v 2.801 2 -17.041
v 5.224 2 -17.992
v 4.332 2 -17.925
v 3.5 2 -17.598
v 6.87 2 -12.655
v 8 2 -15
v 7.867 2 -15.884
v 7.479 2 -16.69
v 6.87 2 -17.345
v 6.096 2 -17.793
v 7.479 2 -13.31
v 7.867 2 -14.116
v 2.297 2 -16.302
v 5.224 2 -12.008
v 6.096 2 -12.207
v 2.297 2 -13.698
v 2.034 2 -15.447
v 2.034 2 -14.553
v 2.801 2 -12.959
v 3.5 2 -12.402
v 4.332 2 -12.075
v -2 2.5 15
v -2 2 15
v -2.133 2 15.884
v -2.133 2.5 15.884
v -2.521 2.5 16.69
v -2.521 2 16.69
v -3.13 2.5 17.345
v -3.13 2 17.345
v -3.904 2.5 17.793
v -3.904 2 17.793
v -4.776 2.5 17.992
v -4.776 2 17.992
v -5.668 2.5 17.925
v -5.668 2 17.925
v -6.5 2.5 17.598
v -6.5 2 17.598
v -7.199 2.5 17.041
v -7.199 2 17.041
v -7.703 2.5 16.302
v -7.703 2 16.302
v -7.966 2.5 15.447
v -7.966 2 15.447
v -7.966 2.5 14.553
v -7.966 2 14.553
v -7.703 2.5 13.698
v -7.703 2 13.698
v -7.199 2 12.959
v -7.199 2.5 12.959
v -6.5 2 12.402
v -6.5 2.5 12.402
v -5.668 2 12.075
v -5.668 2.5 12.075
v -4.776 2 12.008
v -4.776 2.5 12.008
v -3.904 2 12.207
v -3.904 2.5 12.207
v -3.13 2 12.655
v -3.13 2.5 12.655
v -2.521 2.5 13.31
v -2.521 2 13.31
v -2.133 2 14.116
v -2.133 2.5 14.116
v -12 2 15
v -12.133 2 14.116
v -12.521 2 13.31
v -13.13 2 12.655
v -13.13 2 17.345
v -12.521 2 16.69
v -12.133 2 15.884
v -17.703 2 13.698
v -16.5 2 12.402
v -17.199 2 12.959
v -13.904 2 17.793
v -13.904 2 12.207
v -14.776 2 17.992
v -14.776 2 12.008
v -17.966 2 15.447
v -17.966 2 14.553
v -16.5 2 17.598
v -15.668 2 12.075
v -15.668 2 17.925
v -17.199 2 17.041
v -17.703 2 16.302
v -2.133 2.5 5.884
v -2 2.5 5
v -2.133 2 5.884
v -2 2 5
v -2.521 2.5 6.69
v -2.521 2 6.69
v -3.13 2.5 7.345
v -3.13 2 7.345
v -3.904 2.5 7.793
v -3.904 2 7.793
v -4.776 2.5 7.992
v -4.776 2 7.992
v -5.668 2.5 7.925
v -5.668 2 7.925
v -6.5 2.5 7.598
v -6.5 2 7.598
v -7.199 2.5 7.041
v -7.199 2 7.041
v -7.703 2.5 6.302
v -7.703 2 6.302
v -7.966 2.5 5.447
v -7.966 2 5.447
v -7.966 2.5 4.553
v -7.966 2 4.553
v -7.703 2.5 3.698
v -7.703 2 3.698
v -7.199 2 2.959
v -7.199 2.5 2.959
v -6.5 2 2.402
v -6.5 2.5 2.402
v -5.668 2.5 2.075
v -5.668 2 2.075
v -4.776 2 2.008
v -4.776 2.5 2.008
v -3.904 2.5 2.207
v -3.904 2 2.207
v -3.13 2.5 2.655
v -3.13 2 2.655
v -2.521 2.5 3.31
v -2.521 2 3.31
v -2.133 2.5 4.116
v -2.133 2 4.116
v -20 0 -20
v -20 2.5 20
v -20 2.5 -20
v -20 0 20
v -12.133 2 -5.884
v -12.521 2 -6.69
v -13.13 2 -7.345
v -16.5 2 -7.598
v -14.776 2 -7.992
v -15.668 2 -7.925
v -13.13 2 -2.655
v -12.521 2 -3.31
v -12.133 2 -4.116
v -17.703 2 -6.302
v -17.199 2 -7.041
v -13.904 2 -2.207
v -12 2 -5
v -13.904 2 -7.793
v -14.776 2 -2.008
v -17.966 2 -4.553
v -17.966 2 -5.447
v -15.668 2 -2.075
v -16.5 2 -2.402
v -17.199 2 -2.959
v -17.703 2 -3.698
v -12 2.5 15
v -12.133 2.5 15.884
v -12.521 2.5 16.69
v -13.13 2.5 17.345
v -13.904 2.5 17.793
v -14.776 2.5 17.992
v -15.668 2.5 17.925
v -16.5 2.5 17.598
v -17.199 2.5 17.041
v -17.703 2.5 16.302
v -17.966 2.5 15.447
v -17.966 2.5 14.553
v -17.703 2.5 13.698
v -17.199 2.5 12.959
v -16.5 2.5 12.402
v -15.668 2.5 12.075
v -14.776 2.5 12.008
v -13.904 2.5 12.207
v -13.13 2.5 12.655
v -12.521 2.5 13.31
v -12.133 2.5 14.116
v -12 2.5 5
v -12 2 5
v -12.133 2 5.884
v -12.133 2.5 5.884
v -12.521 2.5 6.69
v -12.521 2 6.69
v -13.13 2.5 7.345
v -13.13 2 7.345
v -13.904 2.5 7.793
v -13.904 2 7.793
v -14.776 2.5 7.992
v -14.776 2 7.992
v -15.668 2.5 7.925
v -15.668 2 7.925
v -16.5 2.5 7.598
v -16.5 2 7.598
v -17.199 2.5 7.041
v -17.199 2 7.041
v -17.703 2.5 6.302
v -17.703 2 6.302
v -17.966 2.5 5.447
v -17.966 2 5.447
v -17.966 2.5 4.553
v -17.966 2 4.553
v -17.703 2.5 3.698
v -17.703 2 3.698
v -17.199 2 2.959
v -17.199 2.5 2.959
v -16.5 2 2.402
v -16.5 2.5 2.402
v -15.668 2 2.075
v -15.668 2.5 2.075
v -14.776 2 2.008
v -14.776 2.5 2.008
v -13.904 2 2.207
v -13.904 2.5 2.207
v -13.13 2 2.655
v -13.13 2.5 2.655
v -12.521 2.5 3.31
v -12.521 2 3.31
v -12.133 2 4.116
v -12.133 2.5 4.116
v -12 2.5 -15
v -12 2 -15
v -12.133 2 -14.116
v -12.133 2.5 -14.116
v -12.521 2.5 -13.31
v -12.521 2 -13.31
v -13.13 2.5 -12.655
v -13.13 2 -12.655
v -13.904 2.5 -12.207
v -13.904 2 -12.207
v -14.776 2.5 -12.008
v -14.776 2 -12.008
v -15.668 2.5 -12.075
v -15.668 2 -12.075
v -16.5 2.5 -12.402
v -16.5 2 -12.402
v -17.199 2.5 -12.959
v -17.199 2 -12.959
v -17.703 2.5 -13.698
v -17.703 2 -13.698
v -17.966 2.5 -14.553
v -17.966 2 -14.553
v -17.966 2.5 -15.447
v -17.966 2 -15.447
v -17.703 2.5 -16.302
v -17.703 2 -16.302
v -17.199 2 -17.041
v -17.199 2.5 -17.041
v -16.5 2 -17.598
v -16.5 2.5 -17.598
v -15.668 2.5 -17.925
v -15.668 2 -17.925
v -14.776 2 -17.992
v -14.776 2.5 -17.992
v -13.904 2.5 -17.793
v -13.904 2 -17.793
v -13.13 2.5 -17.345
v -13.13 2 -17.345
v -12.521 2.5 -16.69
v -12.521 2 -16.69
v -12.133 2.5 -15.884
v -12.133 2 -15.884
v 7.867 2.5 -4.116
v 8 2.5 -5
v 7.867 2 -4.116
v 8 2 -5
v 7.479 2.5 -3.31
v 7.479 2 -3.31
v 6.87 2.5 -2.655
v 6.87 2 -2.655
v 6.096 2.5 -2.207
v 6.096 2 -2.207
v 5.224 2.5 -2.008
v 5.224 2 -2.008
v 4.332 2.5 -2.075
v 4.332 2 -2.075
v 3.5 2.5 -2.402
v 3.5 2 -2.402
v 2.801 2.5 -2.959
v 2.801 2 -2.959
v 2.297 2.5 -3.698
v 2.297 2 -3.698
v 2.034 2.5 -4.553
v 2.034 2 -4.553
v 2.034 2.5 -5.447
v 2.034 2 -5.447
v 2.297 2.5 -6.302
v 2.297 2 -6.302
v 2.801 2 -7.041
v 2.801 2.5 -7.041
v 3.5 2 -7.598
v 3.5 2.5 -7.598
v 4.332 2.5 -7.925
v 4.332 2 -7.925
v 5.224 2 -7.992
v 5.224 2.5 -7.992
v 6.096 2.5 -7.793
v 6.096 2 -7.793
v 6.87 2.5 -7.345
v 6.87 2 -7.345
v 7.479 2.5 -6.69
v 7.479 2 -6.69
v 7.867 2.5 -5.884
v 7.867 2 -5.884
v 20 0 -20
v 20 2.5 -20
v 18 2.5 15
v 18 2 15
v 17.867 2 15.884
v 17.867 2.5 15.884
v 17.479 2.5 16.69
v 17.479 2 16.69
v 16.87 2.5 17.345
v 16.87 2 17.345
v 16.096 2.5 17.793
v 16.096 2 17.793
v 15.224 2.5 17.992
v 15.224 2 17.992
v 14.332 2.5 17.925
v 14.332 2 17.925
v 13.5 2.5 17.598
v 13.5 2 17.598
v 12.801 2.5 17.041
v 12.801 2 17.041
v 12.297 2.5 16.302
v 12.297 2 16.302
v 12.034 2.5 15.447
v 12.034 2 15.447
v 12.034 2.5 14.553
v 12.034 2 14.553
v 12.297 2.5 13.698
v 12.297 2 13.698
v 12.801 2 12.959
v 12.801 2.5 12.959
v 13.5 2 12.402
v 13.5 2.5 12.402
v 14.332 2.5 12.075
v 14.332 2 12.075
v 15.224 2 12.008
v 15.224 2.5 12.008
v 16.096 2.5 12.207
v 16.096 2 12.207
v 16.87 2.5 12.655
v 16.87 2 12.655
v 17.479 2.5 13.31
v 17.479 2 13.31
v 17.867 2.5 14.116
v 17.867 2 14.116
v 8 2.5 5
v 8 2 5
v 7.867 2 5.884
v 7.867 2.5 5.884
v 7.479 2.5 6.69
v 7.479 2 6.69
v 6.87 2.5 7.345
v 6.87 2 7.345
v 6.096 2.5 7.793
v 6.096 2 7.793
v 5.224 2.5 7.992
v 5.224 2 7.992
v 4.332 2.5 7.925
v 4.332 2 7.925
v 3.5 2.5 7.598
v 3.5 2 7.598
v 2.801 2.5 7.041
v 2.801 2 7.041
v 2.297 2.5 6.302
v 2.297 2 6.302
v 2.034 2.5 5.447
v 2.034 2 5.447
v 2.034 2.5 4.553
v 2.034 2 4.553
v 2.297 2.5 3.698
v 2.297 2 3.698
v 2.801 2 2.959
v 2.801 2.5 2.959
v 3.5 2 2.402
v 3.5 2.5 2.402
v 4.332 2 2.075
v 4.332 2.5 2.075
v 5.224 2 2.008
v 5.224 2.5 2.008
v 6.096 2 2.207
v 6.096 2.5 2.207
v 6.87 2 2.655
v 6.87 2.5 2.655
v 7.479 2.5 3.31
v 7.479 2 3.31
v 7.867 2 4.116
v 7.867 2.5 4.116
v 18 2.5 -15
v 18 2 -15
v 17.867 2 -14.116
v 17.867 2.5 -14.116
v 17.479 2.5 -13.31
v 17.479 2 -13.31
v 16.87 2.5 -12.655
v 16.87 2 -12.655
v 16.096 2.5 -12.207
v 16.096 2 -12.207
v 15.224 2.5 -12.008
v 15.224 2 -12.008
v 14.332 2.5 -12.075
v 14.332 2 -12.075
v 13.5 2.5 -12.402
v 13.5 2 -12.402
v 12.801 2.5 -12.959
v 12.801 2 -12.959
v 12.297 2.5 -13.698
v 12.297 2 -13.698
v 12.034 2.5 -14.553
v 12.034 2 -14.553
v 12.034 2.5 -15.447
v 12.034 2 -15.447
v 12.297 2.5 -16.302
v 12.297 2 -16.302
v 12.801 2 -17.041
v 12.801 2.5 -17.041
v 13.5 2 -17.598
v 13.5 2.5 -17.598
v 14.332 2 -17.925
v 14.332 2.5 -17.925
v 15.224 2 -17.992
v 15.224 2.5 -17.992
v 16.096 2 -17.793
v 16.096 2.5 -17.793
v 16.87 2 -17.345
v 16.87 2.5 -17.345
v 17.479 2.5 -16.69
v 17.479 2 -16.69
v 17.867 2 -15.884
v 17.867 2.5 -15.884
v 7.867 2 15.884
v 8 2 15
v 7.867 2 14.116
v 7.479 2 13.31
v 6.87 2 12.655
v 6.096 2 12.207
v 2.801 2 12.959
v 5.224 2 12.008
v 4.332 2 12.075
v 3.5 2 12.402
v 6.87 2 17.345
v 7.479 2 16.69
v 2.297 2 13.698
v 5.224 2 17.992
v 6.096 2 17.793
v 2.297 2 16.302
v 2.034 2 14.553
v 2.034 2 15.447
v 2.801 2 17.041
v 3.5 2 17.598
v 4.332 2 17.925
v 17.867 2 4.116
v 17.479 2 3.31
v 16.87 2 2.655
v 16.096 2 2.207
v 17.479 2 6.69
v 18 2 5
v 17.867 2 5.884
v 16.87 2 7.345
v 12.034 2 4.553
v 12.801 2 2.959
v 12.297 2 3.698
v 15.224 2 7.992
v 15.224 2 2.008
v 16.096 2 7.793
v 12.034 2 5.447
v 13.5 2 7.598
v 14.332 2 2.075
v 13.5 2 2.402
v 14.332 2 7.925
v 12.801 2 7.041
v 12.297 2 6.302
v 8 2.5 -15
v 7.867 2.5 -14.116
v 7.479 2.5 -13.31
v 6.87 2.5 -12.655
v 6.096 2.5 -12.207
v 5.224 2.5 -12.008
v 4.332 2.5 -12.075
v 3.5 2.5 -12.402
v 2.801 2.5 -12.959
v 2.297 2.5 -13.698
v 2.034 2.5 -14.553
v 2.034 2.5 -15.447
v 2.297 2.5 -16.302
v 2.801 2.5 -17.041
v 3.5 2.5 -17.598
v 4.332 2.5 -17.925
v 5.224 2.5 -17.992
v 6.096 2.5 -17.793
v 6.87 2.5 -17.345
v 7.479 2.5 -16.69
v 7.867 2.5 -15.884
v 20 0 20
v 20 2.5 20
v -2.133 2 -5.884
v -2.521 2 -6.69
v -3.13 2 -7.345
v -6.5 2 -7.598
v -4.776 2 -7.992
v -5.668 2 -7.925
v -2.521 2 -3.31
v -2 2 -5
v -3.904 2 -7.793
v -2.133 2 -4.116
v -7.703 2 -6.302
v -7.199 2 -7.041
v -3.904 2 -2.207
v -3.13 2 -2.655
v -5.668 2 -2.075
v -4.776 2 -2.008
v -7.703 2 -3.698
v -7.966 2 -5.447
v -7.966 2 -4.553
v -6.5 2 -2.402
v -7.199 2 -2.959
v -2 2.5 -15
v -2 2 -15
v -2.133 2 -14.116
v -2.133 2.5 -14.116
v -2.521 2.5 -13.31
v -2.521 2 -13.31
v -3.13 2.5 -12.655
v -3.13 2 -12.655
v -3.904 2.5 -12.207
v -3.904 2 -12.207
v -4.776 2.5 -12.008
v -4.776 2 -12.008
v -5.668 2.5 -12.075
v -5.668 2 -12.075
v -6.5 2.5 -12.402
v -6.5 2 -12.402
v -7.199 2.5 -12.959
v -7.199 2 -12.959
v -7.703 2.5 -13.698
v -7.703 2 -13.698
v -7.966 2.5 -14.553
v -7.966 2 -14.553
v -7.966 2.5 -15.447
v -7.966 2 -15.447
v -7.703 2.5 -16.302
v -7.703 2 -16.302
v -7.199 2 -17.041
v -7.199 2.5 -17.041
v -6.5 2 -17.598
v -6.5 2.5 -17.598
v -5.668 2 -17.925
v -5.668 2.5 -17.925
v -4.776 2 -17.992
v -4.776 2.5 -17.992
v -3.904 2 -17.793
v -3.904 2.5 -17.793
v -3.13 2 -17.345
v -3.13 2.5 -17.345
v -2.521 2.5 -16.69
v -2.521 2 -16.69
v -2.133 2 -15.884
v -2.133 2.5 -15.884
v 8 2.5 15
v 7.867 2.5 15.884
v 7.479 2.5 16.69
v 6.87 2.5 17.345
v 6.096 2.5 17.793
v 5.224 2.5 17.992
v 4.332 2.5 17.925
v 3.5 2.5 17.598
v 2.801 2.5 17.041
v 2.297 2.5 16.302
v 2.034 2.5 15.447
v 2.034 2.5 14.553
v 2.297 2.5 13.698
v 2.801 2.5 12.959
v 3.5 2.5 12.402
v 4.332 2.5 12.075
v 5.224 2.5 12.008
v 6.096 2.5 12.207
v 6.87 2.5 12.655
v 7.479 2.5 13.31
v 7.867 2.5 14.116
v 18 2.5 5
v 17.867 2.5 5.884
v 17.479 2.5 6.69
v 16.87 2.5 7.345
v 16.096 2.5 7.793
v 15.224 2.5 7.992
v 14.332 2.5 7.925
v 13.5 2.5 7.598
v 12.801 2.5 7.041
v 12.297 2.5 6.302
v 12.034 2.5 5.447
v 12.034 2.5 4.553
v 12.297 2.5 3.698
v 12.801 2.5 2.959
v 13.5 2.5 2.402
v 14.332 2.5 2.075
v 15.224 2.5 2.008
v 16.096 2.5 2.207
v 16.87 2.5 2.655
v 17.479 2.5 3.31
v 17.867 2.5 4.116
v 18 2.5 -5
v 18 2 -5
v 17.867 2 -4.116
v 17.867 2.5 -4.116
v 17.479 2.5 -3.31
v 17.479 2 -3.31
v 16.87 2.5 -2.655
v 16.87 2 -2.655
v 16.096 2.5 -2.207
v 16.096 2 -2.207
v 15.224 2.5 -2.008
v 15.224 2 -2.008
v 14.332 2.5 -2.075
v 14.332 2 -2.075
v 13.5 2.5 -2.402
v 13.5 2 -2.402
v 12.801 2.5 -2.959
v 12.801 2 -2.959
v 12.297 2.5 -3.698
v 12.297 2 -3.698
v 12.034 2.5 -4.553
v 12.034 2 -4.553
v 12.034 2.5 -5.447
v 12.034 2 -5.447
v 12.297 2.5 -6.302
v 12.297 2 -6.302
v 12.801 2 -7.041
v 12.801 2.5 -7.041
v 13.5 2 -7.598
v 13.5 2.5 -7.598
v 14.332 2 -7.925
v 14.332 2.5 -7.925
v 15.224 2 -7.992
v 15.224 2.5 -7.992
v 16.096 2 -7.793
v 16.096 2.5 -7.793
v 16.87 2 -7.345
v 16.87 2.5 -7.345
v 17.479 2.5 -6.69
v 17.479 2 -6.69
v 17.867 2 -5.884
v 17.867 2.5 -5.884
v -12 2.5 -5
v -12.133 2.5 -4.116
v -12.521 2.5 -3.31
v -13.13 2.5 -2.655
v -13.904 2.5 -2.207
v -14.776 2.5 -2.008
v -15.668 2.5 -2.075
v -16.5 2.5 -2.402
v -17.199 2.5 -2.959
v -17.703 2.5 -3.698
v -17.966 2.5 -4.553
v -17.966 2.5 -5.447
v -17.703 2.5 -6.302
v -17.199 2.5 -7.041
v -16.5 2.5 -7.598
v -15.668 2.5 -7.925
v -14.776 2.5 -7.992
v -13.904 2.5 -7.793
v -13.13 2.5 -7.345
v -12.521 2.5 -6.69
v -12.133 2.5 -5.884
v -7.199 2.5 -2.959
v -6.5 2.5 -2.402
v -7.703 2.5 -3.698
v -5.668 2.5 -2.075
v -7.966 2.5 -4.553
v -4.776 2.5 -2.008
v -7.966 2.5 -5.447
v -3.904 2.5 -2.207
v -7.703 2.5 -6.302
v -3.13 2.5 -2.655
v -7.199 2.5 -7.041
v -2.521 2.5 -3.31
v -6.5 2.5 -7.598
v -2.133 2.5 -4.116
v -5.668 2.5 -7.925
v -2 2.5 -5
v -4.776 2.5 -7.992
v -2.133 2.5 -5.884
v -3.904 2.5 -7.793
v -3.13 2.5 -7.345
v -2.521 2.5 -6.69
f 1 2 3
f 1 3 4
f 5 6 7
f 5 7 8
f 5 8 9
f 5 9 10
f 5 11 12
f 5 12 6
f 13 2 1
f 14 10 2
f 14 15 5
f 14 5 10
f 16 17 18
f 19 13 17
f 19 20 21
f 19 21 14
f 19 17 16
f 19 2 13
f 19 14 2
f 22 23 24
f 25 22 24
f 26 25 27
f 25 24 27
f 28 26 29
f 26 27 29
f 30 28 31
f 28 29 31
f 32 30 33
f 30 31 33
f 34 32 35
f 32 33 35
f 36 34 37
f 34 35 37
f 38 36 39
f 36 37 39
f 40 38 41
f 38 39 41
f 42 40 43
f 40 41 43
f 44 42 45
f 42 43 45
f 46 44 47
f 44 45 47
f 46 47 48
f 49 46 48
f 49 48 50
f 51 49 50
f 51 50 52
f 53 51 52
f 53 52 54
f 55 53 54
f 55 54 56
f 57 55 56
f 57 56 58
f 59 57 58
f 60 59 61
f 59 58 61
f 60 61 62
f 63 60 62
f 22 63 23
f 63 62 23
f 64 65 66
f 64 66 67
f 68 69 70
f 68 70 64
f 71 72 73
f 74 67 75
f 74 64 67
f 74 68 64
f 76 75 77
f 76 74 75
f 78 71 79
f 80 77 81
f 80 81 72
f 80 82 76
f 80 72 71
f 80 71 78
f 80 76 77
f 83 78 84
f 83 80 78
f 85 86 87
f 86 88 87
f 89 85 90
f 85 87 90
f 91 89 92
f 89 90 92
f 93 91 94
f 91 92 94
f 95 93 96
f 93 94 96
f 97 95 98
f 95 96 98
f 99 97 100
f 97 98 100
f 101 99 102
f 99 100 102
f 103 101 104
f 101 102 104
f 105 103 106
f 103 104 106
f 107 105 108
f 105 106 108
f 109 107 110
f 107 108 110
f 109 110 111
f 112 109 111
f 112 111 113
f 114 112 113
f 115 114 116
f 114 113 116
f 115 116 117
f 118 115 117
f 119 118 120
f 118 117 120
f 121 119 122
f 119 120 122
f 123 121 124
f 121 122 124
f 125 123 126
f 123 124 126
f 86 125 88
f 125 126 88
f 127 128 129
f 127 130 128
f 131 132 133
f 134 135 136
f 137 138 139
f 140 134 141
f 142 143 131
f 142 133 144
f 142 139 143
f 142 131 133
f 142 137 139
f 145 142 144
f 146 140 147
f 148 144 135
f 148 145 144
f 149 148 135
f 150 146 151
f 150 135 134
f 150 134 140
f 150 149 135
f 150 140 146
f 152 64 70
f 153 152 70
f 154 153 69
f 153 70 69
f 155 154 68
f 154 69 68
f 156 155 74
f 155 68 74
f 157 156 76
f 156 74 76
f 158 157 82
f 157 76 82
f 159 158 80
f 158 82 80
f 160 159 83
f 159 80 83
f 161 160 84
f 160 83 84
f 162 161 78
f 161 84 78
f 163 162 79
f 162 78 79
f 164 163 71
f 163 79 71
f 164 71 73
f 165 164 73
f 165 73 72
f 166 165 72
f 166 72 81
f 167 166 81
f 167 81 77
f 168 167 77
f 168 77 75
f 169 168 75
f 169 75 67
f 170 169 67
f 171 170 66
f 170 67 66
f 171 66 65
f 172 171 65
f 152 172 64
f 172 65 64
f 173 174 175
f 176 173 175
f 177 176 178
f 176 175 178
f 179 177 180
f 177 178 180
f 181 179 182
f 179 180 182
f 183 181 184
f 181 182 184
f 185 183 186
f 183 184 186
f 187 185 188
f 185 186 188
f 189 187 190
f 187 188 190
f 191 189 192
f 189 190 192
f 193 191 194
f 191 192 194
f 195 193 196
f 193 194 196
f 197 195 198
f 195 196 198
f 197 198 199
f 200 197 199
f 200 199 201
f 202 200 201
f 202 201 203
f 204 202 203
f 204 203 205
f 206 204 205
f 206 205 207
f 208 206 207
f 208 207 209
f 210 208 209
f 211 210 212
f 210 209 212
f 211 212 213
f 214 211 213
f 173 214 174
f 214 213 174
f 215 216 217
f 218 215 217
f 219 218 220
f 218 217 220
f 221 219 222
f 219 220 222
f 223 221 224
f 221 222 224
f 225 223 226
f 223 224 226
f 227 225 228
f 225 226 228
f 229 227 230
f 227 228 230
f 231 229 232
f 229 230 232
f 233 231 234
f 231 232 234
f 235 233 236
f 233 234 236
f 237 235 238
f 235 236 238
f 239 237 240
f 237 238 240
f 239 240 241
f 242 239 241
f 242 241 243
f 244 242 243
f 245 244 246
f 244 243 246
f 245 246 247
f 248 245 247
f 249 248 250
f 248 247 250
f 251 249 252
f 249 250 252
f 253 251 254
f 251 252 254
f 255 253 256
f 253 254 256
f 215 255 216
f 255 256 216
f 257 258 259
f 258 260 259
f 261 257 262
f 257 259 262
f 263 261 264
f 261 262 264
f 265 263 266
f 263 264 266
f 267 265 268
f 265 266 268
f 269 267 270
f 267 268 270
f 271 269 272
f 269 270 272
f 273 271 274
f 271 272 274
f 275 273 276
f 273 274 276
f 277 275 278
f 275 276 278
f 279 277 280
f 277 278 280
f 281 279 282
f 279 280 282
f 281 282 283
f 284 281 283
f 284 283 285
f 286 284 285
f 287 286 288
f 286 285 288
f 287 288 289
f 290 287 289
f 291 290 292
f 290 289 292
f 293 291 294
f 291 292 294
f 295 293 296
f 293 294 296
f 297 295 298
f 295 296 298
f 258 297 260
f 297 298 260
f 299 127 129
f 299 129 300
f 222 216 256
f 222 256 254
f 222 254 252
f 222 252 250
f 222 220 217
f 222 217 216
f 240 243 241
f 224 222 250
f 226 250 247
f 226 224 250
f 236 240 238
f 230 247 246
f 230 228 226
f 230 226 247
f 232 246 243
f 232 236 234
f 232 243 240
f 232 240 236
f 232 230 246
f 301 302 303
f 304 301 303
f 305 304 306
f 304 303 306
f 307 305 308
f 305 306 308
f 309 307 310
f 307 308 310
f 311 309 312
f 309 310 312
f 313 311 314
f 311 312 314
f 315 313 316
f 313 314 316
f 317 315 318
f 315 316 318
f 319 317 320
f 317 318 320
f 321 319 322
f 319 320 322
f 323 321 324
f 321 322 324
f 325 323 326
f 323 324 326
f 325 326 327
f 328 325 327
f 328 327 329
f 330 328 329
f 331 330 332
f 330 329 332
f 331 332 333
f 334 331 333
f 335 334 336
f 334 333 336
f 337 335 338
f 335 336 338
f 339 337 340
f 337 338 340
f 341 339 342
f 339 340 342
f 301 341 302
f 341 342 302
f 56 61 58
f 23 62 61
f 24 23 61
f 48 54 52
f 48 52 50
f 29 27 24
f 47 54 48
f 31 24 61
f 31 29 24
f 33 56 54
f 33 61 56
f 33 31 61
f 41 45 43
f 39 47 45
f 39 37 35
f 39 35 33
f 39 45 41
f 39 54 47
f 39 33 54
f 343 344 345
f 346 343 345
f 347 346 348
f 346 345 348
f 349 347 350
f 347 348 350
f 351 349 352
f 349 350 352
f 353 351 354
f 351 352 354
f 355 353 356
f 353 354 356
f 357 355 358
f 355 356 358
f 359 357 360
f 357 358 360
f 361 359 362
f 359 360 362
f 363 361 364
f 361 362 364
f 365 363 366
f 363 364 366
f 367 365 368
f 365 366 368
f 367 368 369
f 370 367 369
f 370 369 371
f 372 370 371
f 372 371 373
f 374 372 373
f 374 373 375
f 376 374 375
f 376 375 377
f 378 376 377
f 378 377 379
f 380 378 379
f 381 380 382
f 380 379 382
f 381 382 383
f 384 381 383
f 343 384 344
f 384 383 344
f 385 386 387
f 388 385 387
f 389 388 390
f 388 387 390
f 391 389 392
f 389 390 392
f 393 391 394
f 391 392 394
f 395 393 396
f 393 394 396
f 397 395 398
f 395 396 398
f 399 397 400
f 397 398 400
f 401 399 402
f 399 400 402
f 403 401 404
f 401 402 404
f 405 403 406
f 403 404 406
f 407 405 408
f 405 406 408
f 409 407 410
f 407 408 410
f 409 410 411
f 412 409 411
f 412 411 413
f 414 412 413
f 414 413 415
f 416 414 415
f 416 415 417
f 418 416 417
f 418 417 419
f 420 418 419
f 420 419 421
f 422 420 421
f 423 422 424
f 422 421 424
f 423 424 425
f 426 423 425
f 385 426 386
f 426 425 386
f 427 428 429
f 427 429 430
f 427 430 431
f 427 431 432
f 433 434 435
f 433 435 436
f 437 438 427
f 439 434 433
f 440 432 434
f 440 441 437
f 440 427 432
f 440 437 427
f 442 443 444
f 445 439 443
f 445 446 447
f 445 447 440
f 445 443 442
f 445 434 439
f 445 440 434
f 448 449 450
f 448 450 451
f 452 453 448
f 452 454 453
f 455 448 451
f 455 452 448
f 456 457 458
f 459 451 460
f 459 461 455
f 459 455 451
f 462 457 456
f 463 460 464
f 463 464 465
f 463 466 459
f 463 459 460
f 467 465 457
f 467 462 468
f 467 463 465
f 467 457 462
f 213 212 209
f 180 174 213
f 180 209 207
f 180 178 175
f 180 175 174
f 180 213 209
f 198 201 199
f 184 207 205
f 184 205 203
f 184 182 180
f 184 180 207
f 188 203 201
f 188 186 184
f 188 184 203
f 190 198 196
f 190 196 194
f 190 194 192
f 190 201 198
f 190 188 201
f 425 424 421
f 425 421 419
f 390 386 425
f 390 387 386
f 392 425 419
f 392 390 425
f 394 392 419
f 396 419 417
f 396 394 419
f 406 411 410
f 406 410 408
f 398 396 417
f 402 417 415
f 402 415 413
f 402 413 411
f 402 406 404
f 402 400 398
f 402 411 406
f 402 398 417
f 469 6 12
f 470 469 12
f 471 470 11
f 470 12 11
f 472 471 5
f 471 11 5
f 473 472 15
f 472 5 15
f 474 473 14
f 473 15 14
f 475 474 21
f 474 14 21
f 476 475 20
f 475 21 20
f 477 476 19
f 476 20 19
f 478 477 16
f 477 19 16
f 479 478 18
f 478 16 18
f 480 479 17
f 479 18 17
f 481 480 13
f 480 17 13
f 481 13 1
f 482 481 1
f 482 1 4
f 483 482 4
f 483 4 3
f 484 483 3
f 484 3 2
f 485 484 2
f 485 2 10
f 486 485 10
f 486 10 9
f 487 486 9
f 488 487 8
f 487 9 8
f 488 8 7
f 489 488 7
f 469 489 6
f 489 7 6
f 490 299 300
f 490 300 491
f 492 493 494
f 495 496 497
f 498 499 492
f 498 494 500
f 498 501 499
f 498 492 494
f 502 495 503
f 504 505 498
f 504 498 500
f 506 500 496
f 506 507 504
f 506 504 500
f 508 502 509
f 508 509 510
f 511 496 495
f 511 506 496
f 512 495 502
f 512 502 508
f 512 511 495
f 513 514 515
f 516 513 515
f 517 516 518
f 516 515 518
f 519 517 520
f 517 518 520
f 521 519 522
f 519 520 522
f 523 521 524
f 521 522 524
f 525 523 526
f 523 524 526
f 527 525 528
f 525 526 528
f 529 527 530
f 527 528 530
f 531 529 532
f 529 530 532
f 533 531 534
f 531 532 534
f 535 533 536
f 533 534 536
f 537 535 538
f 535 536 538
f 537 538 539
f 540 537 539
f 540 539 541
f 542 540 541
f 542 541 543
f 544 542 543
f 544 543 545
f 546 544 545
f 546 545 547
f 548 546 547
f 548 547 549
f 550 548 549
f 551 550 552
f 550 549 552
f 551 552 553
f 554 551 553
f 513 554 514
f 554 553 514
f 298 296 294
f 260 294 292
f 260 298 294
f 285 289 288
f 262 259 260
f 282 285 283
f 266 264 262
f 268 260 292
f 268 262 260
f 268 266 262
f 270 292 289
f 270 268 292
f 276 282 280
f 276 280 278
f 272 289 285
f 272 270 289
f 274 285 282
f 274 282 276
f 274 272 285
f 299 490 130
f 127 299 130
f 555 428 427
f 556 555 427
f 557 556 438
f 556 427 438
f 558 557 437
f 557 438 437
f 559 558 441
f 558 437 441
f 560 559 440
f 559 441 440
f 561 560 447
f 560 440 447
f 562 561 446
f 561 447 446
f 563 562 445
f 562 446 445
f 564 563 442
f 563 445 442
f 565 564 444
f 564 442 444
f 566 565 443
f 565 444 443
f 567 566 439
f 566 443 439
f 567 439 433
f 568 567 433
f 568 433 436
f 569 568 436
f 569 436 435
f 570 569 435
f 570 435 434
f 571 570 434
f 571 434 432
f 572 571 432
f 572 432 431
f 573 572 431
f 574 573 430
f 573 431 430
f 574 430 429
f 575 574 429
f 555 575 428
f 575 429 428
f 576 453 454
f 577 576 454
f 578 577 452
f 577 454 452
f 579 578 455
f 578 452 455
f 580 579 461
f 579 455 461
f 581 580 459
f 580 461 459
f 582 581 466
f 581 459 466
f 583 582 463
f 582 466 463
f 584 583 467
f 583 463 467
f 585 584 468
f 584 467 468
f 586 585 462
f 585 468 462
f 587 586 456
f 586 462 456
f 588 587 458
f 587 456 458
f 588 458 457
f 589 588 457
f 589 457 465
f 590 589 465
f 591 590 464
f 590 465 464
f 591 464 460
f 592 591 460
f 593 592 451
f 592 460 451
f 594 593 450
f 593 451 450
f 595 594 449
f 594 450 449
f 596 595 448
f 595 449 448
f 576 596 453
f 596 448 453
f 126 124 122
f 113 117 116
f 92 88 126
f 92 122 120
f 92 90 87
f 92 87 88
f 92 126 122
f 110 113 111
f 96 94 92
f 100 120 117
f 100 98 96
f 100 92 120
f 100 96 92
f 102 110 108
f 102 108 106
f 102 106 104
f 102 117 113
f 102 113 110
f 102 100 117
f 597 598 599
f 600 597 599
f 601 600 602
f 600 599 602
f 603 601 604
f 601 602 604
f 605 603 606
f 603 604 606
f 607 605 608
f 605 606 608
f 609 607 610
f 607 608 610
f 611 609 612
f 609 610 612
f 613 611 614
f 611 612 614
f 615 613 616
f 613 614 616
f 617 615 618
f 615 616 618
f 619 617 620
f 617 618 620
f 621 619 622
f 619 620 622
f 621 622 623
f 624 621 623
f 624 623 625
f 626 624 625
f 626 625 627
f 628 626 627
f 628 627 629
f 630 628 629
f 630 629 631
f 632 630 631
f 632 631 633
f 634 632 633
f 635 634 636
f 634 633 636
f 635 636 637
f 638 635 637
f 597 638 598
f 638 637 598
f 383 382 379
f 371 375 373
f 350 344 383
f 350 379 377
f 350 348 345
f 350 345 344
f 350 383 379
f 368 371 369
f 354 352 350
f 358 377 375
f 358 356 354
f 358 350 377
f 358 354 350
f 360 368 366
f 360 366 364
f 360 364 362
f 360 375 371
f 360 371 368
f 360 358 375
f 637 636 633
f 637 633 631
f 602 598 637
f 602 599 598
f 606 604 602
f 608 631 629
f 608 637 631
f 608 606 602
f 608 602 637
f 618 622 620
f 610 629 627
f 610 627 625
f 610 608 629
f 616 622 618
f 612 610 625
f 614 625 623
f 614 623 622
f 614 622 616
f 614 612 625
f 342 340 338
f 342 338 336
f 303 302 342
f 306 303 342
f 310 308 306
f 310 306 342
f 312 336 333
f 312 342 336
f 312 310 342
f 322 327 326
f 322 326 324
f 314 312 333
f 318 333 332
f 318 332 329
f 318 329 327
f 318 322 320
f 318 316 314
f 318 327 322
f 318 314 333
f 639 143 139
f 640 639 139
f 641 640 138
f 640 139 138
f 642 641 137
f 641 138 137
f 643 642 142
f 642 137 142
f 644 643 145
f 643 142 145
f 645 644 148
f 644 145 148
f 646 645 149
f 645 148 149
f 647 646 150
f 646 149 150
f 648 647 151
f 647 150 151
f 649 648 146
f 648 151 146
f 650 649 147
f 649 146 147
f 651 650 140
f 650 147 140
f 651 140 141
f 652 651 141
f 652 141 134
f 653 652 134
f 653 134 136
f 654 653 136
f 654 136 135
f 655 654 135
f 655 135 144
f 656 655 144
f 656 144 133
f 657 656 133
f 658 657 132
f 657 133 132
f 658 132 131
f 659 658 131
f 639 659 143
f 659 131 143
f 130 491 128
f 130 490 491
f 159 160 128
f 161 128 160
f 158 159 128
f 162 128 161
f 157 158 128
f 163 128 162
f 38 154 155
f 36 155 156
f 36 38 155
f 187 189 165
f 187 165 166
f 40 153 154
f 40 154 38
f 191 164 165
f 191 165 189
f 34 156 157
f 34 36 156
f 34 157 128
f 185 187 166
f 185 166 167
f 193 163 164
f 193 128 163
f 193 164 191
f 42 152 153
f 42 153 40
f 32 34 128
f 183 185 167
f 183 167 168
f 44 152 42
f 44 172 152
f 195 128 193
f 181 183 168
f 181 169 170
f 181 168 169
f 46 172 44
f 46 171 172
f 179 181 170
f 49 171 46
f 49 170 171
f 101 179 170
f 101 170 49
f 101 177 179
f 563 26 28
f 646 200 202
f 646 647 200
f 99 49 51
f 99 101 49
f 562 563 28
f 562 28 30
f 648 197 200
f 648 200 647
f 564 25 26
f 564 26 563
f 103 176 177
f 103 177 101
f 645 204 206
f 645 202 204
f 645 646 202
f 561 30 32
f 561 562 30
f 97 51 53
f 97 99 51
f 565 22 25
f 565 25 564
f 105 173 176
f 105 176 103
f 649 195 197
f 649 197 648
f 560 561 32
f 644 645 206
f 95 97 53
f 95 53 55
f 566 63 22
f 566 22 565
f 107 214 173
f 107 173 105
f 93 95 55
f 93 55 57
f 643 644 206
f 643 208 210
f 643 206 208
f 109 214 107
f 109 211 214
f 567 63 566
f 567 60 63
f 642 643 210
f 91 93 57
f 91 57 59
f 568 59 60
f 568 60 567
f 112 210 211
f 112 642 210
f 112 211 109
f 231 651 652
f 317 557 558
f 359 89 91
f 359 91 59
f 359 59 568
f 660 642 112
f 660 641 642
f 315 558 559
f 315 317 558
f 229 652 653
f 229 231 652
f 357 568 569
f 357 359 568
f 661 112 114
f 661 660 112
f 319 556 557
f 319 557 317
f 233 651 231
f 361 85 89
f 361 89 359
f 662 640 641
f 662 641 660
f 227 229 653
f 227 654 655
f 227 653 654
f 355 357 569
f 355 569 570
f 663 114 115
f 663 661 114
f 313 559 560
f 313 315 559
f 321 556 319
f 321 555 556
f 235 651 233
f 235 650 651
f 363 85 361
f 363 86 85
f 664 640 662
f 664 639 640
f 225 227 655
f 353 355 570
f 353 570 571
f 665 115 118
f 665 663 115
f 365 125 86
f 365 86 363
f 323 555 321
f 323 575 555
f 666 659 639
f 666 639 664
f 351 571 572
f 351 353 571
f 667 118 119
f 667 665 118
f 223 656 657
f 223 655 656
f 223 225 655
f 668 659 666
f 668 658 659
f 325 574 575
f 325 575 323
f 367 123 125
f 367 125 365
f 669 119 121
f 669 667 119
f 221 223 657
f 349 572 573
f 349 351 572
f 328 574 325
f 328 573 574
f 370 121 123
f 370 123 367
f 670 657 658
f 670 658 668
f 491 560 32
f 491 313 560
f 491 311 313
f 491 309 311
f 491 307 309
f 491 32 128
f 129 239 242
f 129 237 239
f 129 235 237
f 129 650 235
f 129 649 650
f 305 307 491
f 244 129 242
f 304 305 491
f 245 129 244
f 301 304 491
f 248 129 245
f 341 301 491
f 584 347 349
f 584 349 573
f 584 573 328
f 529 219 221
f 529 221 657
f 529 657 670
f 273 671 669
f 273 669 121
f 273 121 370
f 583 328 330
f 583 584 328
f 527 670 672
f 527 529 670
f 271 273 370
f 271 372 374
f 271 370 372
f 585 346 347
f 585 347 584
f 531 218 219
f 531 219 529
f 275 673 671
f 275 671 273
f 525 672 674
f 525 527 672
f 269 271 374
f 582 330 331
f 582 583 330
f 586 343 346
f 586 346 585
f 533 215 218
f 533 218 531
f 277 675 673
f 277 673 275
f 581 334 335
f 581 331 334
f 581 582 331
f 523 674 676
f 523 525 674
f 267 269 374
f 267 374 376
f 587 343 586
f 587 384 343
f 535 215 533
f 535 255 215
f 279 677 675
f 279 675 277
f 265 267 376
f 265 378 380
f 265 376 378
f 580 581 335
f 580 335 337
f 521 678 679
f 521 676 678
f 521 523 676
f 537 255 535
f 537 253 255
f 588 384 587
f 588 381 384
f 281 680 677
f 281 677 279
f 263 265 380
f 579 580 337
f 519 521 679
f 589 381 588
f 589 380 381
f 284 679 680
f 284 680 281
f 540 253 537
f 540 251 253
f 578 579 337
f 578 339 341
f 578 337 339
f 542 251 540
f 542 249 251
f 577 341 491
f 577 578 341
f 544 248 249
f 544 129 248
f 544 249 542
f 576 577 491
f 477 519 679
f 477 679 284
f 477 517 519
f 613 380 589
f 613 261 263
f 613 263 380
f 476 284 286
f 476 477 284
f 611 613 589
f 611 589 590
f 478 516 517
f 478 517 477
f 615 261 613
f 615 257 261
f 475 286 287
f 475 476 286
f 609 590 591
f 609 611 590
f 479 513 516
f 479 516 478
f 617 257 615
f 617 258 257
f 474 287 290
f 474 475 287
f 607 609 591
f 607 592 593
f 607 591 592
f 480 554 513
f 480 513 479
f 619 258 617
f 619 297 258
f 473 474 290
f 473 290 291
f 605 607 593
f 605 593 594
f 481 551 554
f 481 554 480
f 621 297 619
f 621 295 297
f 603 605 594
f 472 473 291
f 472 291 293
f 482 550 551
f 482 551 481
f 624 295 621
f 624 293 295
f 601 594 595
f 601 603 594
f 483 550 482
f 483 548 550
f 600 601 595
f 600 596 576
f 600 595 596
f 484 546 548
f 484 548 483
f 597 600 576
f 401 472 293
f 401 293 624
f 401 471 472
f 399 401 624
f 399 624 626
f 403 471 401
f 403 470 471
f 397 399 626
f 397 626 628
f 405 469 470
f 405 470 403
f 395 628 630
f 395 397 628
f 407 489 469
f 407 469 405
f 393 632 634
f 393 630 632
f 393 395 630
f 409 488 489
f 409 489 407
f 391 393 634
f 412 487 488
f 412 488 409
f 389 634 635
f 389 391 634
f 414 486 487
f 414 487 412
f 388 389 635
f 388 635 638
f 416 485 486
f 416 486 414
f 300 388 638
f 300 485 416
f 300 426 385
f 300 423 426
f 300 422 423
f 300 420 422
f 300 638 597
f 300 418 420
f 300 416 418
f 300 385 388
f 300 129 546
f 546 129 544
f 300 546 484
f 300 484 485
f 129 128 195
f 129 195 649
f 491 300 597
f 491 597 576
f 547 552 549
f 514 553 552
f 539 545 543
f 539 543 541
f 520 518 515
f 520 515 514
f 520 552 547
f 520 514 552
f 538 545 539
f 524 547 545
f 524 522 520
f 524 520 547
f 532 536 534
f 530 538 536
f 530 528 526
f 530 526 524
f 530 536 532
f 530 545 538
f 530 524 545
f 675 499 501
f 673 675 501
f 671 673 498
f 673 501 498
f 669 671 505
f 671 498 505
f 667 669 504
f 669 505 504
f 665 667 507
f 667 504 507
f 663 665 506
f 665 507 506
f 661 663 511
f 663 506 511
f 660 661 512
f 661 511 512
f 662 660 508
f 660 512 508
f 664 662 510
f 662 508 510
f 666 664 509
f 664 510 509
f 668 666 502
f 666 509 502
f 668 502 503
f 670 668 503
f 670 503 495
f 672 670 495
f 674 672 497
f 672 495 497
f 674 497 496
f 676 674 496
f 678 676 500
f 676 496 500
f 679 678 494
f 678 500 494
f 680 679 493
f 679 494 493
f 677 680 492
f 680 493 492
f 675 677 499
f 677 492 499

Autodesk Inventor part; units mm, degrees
ref_plane "YZ Plane" through (0, 0, 0) normal (1, 0, 0) x (0, 1, 0)
ref_plane "XZ Plane" through (0, 0, 0) normal (0, 1, 0) x (-1, 0, 0)
ref_plane "XY Plane" through (0, 0, 0) normal (0, 0, 1) x (1, 0, 0)
sketch "スケッチ1" plane through (0, 0, 0) normal (0, 1, 0) x (-1, 0, 0)
  line L0 (-20, 20) -> (20, 20)
  line L1 (20, 20) -> (20, -20)
  line L2 (20, -20) -> (-20, -20)
  line L3 (-20, -20) -> (-20, 20)
  point P0 (0, 0)
  dimension "d0" = 40
  dimension "d2" = 40
  dimension "d3" = 20
  dimension "d4" = 20
extrude "押し出し1" add sketch "スケッチ1" along normal blind 2
sketch "スケッチ2" plane through (0, 2, 0) normal (0, 1, 0) x (1, 0, 0)
  line L0 (-20, -20) -> (20, -20) projected
  line L1 (20, -20) -> (20, 20) projected
  line L2 (20, 20) -> (-20, 20) projected
  line L3 (-20, 20) -> (-20, -20) projected
  circle A0 centre (-15, -15) radius 3
  circle A1 centre (-5, -15) radius 3
  circle A2 centre (5, -15) radius 3
  circle A3 centre (15, -15) radius 3
  circle A4 centre (-15, -5) radius 3
  circle A5 centre (-15, 5) radius 3
  circle A6 centre (-15, 15) radius 3
  circle A7 centre (-5, -5) radius 3
  circle A8 centre (-5, 5) radius 3
  circle A9 centre (-5, 15) radius 3
  circle A10 centre (5, -5) radius 3
  circle A11 centre (15, -5) radius 3
  circle A12 centre (15, 5) radius 3
  circle A13 centre (5, 5) radius 3
  circle A14 centre (5, 15) radius 3
  circle A15 centre (15, 15) radius 3
  point P0 (0, 0)
  dimension "d7" = 6
  dimension "d9" = 10
  dimension "d10" = 10
  dimension "d11" = 10
  dimension "d12" = 5
  dimension "d13" = 5
  dimension "d14" = 5
  dimension "d15" = 5
  dimension "d16" = 5
  dimension "d17" = 10
  dimension "d18" = 10
  dimension "d19" = 10
  dimension "d20" = 5
  dimension "d21" = 5
  dimension "d22" = 5
  dimension "d23" = 10
  dimension "d24" = 10
  dimension "d25" = 10
  dimension "d26" = 10
  dimension "d27" = 10
  dimension "d28" = 10
  dimension "d29" = 10
  dimension "d30" = 10
  dimension "d31" = 10
  dimension "d32" = 10
  dimension "d33" = 10
  dimension "d34" = 10
  dimension "d35" = 10
  dimension "d36" = 10
  dimension "d37" = 10
  dimension "d38" = 10
  dimension "d39" = 10
  dimension "d40" = 10
extrude "押し出し2" add sketch "スケッチ2" along normal blind 0.5
properties part number "fai6_sikiita"
